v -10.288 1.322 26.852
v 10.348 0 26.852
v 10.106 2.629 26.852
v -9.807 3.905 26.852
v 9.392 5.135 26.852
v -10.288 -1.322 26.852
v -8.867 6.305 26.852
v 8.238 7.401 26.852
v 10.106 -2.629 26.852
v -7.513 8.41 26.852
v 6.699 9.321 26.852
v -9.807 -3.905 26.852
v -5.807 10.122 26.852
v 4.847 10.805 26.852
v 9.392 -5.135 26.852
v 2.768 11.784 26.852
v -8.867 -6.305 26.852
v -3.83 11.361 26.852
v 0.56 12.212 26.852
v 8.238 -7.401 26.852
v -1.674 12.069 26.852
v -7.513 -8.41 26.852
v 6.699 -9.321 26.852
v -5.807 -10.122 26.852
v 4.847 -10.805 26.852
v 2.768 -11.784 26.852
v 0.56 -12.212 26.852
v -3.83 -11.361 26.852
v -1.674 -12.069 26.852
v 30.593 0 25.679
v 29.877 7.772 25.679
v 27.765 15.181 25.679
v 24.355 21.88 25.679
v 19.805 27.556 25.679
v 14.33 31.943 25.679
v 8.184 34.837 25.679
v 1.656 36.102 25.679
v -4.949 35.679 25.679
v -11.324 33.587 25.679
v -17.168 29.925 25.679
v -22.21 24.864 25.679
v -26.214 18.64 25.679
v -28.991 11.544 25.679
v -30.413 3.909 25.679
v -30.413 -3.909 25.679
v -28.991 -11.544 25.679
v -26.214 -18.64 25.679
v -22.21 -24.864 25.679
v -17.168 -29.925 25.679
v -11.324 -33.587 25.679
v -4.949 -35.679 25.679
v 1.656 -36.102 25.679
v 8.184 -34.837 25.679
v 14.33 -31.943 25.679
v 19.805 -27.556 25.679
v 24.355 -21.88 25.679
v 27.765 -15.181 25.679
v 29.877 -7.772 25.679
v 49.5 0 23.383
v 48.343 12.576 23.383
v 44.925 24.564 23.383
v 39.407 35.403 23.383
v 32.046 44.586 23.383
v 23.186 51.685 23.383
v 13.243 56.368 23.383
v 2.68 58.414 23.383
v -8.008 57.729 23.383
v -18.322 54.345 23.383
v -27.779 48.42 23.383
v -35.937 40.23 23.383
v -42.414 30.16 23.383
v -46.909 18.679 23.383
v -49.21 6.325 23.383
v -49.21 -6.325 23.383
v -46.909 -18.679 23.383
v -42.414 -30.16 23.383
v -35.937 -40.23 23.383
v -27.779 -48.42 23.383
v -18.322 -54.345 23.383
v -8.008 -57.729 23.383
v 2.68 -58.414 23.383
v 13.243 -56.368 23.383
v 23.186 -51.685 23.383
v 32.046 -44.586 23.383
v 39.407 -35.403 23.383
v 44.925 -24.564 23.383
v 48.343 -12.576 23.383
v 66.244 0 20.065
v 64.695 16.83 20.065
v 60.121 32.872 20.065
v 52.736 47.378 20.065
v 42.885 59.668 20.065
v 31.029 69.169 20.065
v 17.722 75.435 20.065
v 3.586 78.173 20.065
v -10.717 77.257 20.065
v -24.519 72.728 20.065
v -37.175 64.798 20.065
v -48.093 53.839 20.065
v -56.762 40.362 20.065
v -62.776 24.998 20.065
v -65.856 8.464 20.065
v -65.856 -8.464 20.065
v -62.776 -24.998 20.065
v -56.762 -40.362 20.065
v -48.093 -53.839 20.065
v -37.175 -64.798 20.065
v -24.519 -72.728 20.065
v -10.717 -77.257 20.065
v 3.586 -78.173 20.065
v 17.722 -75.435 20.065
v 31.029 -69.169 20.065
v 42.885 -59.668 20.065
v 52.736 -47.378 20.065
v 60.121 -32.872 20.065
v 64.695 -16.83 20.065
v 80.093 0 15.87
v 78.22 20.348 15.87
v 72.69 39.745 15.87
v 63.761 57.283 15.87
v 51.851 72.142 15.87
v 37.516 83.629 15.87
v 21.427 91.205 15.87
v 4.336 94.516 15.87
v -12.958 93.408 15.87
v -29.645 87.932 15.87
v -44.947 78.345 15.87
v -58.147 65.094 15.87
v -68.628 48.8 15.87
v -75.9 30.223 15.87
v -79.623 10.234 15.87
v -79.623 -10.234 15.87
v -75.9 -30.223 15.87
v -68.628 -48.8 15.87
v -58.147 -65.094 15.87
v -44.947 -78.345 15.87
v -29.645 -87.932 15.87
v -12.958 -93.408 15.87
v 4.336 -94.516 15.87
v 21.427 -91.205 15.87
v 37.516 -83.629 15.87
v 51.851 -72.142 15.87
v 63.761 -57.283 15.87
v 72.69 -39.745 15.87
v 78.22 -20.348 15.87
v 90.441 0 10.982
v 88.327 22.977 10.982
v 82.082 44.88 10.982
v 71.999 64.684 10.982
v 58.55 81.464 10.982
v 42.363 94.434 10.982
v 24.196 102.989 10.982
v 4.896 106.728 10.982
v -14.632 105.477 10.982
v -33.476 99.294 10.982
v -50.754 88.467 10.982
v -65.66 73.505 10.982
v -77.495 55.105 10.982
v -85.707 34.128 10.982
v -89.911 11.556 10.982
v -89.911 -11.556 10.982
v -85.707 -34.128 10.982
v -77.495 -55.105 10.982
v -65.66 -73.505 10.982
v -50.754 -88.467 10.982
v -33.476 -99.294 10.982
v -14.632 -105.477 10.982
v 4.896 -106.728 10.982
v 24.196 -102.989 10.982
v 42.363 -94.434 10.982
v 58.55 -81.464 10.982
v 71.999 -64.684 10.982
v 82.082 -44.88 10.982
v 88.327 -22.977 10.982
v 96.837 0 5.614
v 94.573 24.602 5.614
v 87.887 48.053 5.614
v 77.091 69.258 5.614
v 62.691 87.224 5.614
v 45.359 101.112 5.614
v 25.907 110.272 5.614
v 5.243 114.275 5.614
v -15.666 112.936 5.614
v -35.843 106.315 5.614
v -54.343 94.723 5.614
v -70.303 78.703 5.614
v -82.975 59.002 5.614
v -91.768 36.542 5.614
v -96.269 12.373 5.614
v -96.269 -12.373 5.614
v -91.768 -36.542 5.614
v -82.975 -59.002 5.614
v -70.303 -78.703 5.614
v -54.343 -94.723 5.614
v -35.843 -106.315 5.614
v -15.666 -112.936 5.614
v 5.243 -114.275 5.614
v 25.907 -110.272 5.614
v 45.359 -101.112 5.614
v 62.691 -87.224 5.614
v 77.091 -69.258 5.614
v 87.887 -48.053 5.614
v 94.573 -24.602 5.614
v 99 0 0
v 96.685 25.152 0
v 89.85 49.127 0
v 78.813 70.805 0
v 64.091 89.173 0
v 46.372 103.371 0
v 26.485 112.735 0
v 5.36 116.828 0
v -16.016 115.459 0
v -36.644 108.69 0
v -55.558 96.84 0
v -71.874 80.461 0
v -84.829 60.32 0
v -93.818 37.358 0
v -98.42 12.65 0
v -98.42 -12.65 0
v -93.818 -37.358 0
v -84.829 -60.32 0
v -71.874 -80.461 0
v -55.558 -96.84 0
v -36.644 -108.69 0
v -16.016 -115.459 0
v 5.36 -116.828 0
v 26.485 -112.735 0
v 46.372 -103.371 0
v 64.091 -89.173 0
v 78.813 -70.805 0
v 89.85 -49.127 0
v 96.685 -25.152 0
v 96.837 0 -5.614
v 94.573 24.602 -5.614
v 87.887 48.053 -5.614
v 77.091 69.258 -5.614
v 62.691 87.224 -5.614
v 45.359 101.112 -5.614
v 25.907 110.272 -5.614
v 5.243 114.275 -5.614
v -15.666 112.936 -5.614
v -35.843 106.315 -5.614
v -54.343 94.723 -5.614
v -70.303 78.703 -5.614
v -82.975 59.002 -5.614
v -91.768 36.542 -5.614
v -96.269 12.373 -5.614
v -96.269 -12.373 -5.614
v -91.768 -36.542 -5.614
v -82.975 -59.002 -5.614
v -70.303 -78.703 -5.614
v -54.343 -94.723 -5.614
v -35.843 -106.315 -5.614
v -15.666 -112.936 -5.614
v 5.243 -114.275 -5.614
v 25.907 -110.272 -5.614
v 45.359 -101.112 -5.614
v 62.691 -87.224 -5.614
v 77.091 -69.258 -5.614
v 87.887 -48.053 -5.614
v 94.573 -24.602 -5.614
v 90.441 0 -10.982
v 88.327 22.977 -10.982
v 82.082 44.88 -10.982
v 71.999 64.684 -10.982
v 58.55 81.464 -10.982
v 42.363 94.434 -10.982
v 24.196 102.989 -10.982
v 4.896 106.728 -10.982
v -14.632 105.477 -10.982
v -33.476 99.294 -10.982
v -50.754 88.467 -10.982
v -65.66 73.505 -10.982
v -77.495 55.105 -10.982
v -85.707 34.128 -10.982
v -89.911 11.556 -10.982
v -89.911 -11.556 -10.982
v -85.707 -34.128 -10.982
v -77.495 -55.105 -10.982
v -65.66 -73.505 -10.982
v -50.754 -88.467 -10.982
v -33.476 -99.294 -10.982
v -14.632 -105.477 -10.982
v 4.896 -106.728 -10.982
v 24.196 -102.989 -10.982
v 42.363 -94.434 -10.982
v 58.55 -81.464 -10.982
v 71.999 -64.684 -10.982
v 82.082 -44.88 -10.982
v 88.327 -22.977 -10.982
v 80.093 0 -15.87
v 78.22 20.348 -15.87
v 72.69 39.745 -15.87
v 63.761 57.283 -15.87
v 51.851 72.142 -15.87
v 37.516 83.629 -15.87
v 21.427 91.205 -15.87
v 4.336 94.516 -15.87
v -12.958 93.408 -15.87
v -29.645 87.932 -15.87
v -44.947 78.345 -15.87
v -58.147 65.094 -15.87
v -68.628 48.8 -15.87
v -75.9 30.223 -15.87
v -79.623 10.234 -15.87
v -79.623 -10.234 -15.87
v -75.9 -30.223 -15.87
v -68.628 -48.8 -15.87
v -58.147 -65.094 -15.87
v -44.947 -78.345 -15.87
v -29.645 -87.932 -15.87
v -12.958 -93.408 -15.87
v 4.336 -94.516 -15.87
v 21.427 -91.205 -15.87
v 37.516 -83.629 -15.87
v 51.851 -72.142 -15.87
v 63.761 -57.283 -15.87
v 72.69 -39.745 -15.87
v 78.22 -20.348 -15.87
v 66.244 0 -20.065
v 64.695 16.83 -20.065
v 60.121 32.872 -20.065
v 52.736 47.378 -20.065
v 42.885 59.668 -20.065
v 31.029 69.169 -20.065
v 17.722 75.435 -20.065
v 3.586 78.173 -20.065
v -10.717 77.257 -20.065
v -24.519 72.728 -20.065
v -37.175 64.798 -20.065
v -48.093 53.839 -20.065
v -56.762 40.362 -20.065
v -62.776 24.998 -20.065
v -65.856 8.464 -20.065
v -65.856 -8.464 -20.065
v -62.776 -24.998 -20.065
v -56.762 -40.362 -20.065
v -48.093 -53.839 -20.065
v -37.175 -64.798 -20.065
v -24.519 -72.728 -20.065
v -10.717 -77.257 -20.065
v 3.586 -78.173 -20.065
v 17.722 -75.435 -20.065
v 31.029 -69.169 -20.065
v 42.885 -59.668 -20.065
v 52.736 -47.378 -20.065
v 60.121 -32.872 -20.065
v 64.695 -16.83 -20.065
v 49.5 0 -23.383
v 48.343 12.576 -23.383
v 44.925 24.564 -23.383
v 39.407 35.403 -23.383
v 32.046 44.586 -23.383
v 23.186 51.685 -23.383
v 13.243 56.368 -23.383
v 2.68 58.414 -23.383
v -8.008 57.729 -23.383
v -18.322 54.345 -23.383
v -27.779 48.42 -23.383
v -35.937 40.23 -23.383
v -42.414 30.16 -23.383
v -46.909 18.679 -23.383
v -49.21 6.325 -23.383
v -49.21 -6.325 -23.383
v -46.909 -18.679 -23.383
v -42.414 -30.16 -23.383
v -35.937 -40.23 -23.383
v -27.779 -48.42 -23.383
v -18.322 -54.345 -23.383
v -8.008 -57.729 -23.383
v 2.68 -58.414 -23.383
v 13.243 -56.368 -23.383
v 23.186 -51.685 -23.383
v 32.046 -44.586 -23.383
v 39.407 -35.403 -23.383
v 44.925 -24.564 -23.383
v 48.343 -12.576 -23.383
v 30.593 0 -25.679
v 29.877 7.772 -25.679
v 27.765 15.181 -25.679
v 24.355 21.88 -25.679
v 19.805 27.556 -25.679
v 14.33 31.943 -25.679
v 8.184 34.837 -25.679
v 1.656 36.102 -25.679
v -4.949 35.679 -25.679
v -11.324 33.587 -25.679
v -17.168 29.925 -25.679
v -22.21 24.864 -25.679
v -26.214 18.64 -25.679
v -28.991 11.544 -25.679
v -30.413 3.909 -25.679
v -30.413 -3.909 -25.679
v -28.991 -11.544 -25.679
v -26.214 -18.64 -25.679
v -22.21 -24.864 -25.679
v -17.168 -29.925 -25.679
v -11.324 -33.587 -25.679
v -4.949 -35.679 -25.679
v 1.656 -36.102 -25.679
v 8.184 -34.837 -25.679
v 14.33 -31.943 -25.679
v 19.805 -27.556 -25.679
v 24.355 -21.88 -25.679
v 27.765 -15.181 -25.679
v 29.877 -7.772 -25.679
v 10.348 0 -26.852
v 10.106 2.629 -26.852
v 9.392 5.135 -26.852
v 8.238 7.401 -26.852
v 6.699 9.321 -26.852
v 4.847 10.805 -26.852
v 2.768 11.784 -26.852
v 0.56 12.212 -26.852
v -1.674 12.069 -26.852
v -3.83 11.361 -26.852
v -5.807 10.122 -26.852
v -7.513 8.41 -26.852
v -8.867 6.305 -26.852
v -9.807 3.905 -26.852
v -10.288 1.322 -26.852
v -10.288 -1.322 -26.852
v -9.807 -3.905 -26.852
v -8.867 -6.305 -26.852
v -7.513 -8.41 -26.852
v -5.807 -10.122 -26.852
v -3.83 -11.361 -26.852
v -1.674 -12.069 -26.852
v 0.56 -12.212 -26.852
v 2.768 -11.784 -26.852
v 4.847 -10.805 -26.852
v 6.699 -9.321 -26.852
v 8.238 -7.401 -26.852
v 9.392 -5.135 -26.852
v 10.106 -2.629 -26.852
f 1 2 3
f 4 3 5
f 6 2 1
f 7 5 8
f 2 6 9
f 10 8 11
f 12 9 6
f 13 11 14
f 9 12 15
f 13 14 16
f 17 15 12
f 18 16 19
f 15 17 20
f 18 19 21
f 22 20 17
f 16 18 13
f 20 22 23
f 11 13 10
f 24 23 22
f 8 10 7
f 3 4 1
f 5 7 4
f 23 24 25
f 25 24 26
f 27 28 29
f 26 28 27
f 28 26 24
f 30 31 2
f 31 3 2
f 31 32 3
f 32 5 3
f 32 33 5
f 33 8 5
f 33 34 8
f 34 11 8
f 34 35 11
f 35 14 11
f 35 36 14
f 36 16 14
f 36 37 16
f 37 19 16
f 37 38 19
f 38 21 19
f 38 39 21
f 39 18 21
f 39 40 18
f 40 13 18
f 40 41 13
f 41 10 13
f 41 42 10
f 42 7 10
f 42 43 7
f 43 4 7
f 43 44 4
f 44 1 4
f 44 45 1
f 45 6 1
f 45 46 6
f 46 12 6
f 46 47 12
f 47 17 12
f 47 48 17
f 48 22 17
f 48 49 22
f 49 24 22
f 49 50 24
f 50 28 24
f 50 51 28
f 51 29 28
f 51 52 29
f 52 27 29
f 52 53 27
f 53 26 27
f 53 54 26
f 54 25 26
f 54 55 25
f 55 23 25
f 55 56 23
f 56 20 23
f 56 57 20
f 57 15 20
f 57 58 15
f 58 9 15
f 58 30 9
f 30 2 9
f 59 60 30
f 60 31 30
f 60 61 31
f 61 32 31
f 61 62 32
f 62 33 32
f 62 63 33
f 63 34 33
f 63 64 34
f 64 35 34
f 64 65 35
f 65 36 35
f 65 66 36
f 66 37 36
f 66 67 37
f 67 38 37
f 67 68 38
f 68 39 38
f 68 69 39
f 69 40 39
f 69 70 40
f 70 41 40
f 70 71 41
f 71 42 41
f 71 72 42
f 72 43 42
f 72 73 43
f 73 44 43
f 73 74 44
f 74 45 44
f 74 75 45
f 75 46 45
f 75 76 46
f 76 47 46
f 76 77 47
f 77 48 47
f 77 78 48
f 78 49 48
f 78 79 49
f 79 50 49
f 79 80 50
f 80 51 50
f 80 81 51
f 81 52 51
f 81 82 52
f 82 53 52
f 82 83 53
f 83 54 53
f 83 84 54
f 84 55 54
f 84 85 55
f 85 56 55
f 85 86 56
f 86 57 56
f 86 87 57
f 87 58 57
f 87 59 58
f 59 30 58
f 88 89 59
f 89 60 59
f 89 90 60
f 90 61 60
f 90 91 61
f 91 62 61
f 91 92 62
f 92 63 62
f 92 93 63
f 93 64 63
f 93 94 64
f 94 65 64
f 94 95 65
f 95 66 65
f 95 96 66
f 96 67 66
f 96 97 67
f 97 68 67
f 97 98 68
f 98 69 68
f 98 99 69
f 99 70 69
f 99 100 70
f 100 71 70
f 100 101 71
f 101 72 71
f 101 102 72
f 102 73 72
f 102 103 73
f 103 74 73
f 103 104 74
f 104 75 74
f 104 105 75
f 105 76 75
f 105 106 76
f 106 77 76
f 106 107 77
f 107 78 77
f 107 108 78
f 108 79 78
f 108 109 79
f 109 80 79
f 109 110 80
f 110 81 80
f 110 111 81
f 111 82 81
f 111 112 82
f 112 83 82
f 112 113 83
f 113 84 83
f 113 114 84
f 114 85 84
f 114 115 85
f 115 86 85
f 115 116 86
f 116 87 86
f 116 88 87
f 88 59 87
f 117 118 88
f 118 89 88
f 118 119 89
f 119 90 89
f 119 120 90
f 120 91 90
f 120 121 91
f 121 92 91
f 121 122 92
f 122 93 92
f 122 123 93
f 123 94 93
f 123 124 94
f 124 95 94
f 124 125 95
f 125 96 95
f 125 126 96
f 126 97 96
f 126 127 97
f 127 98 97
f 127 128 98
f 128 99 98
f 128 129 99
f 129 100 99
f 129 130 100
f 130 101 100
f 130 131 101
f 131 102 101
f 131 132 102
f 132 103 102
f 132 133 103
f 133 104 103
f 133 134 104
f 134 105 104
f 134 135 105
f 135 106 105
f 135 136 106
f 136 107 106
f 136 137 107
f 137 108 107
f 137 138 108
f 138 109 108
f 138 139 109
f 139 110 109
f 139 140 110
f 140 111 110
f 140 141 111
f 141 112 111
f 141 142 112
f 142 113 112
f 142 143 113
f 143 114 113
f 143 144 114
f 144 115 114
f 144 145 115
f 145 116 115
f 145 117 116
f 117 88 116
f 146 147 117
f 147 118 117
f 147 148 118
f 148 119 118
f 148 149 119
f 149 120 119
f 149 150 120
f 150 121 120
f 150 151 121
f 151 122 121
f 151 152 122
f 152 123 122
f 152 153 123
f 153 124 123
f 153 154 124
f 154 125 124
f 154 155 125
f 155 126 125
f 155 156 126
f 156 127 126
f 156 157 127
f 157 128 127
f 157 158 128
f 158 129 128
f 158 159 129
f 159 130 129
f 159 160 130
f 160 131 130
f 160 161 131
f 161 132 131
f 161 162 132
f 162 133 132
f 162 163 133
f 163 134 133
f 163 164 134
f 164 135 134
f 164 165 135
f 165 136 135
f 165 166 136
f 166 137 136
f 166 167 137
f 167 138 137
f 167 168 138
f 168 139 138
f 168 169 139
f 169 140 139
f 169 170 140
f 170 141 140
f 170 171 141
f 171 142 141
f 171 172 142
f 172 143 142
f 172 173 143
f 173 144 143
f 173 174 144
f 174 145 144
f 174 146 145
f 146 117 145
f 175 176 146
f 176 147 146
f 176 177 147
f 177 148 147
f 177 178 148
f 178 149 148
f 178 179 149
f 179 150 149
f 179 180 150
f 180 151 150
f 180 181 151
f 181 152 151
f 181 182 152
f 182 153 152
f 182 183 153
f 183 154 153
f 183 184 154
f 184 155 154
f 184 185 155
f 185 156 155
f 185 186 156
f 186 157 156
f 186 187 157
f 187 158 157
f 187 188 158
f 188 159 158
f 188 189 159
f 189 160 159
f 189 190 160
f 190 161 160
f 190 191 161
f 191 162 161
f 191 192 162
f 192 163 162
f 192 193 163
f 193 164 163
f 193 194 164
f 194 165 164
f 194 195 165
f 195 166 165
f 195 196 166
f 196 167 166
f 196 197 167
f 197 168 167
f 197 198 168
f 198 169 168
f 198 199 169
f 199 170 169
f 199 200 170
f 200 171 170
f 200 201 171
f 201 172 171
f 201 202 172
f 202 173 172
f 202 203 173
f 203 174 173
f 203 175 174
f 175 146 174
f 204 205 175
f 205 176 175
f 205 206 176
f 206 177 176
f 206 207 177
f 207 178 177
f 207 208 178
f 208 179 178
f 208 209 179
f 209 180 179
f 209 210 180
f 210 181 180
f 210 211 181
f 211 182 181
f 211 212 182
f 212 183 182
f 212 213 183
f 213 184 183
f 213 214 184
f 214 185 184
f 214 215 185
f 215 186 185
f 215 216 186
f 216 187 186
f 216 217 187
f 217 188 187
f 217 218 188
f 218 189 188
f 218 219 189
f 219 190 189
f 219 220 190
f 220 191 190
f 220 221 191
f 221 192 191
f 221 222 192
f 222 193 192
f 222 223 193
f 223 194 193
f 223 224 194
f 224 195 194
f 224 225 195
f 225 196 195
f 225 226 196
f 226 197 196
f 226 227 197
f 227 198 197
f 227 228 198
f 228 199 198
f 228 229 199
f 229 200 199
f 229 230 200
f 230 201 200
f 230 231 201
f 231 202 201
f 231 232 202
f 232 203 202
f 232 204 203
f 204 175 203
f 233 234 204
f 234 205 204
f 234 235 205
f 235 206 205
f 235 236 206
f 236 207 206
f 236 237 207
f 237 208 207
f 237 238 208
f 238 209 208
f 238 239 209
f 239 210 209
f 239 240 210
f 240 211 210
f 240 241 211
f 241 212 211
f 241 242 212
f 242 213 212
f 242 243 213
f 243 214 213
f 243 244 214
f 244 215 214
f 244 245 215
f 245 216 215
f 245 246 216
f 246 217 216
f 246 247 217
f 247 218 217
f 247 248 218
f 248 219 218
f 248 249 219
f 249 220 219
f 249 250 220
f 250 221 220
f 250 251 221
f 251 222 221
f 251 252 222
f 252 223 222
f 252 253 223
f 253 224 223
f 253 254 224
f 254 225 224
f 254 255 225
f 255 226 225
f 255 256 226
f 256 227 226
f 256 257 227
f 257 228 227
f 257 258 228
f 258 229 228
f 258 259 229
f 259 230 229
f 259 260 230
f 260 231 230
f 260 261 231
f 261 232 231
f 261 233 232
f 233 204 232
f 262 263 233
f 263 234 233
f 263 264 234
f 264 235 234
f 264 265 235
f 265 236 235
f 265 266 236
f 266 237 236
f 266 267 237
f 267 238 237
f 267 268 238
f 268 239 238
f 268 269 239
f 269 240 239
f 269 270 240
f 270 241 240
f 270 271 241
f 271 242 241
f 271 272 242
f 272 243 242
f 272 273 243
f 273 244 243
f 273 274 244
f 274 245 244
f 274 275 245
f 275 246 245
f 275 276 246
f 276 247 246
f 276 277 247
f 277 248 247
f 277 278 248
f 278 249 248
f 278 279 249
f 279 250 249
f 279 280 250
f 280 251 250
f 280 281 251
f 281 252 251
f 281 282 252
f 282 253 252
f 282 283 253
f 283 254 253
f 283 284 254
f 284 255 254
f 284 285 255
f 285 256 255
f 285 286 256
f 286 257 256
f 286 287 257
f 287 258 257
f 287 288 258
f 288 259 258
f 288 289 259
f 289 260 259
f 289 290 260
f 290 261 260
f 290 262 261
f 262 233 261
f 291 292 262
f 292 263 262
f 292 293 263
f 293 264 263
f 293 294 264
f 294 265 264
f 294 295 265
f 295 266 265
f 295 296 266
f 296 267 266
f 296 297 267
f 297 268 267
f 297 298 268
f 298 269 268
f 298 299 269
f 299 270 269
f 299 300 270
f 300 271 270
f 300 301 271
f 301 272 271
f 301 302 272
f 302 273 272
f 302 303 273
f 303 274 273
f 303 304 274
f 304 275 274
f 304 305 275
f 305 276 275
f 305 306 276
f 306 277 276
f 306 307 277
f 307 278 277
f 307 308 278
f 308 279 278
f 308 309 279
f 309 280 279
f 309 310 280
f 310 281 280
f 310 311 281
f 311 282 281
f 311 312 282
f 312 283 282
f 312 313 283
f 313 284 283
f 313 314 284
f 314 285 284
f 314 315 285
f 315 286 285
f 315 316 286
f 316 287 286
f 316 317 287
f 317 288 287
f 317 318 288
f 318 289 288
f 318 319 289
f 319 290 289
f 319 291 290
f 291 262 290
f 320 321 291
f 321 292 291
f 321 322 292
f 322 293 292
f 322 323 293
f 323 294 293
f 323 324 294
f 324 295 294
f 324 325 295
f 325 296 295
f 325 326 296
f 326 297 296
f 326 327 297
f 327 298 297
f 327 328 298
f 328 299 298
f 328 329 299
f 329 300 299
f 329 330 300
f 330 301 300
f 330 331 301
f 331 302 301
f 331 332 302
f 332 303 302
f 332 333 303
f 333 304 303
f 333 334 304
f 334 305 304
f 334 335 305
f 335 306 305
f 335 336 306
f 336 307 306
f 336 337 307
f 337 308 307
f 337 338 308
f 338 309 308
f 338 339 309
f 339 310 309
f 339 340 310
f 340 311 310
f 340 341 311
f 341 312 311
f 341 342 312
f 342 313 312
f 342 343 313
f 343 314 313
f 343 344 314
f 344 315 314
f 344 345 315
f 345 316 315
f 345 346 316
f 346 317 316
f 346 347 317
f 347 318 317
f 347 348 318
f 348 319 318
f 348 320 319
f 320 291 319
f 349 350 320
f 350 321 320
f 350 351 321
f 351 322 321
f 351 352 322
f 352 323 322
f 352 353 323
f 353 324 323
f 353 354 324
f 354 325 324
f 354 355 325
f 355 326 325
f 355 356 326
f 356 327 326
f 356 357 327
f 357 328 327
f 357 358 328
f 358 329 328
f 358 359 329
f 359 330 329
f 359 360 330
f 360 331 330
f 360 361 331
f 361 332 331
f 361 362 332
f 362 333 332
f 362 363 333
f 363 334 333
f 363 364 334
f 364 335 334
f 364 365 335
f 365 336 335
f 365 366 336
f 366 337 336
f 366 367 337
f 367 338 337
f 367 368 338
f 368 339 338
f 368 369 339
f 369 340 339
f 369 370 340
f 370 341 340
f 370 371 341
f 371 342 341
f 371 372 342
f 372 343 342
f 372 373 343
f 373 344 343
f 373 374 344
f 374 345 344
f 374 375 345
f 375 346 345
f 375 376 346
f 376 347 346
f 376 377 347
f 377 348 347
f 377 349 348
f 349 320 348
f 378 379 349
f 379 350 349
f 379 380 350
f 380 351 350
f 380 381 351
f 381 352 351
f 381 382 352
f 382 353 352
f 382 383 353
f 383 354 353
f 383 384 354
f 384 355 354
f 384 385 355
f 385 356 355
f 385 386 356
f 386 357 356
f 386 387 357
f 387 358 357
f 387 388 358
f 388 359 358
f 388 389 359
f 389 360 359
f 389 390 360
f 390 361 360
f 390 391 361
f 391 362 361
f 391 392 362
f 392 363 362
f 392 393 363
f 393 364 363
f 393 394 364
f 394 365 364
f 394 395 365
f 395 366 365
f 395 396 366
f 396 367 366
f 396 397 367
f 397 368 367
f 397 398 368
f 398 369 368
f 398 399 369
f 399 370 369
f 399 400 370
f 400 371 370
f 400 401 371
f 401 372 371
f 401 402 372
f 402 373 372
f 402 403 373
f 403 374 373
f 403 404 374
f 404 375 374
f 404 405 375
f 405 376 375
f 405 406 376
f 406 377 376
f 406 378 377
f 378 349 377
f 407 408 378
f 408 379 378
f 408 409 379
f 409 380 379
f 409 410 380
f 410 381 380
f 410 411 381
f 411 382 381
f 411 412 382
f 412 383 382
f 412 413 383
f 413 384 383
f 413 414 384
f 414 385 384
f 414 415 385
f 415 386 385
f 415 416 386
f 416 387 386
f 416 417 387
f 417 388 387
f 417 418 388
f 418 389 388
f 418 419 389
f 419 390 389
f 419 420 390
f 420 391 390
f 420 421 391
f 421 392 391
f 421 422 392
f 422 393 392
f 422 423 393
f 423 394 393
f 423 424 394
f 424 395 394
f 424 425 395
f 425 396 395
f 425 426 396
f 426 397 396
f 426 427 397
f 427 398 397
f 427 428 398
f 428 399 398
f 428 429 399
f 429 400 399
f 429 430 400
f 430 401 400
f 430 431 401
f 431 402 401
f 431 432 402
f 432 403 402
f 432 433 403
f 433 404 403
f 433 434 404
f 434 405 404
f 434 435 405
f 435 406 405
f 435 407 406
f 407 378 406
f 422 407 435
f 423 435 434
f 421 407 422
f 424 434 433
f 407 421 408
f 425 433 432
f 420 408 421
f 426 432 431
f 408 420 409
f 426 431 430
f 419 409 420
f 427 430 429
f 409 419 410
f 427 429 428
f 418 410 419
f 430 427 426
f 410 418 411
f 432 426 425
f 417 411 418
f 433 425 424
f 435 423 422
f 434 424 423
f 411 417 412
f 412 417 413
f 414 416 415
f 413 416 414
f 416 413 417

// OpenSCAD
// Generated by SolidPython 1.0.1 on 2020-07-29 00:46:49


scale(v = [11, 13, 3]) {
	sphere(r = 9);
}
/***********************************************
*********      SolidPython code:      **********
************************************************
 
# import packages: SolidPython
from solid import *
from solid.utils import *
from itertools import chain, combinations, permutations


class Resize:

    def __init__(self, scad_file):
        self.scad_file = scad_file
        #self.scad_file = import_scad(scad_file)
        # cone/cylinder param:
        self.r1 = 0
        self.r2 = 0
        self.h = 0
        # rectangular prism param:
        self.w = 0
        self.l = 0
        # ellipse param:
        self.r = 0

    # import OpenScad code (file name corresponds to shape)


    # classify shape + parameters
    def assign(self, param1, param2, param3):
        if self.scad_file == 'cone.scad':
            self.r1 = param1
            self.r2 = param2
            self.h = param3
        elif self.scad_file == 'cylinder.scad':
            self.r1 = param1
            self.r2 = param2
            self.h = param3
        elif self.scad_file == 'rectangularPrism.scad':
            self.h = param1
            self.l = param2
            self.w = param3
        else:
            self.r = param1
            self.h = param2

    # resize parameters
    def iterate(self):
        x = range(3, 20, 2)
        i = 1
        if self.scad_file == 'cone.scad':
            tempList = list(permutations(x, 2))
            for temp in tempList:
                param1 = temp[0]
                param2 = temp[1]
                filepath = 'produced_scad_files/' + 'cone' + str(param1) + '_' + str(param2) + '_' + '.scad'
                scad_render_to_file(cylinder(h=param1, r1=param2, r2=0), filepath)

        elif self.scad_file == 'cylinder.scad':
            tempList = list(permutations(x, 3))
            for temp in tempList:
                param1 = temp[0]
                param2 = temp[1]
                filepath = 'produced_scad_files/' + 'cylinder' + str(param1) + '_' + str(param2) + '_' + '.scad'
                scad_render_to_file(cylinder(h=param1, r1=param2, r2=param2), filepath)

        elif self.scad_file == 'rectangularPrism.scad':
            tempList = list(permutations(x, 3))
            for temp in tempList:
                param1 = temp[0]
                param2 = temp[1]
                param3 = temp[2]
                filepath = 'produced_scad_files/' + 'rectangularPrism' + str(param1) + '_' + str(param2) + '_' + str(
                    param3) + '.scad'
                scad_render_to_file(cube(size=(param1, param2, param3)), filepath)

        elif self.scad_file == 'ellipse.scad':
            tempList = list(permutations(x, 4))
            for temp in tempList:
                param1 = temp[0]
                param2 = temp[1]
                param3 = temp[2]
                param4 = temp[3]
                filepath = 'produced_scad_files/' + 'ellipse' + str(param1) + '_' + str(param2) + '_' + str(param3) + '_' + str(param4) + '.scad'
                scad_render_to_file(scale([param1, param2, param3])(sphere(r=param4)), filepath)

    def render_to_scadfile(self):
        scad_render_to_file(scad, 'example.scad') 
 
************************************************/
